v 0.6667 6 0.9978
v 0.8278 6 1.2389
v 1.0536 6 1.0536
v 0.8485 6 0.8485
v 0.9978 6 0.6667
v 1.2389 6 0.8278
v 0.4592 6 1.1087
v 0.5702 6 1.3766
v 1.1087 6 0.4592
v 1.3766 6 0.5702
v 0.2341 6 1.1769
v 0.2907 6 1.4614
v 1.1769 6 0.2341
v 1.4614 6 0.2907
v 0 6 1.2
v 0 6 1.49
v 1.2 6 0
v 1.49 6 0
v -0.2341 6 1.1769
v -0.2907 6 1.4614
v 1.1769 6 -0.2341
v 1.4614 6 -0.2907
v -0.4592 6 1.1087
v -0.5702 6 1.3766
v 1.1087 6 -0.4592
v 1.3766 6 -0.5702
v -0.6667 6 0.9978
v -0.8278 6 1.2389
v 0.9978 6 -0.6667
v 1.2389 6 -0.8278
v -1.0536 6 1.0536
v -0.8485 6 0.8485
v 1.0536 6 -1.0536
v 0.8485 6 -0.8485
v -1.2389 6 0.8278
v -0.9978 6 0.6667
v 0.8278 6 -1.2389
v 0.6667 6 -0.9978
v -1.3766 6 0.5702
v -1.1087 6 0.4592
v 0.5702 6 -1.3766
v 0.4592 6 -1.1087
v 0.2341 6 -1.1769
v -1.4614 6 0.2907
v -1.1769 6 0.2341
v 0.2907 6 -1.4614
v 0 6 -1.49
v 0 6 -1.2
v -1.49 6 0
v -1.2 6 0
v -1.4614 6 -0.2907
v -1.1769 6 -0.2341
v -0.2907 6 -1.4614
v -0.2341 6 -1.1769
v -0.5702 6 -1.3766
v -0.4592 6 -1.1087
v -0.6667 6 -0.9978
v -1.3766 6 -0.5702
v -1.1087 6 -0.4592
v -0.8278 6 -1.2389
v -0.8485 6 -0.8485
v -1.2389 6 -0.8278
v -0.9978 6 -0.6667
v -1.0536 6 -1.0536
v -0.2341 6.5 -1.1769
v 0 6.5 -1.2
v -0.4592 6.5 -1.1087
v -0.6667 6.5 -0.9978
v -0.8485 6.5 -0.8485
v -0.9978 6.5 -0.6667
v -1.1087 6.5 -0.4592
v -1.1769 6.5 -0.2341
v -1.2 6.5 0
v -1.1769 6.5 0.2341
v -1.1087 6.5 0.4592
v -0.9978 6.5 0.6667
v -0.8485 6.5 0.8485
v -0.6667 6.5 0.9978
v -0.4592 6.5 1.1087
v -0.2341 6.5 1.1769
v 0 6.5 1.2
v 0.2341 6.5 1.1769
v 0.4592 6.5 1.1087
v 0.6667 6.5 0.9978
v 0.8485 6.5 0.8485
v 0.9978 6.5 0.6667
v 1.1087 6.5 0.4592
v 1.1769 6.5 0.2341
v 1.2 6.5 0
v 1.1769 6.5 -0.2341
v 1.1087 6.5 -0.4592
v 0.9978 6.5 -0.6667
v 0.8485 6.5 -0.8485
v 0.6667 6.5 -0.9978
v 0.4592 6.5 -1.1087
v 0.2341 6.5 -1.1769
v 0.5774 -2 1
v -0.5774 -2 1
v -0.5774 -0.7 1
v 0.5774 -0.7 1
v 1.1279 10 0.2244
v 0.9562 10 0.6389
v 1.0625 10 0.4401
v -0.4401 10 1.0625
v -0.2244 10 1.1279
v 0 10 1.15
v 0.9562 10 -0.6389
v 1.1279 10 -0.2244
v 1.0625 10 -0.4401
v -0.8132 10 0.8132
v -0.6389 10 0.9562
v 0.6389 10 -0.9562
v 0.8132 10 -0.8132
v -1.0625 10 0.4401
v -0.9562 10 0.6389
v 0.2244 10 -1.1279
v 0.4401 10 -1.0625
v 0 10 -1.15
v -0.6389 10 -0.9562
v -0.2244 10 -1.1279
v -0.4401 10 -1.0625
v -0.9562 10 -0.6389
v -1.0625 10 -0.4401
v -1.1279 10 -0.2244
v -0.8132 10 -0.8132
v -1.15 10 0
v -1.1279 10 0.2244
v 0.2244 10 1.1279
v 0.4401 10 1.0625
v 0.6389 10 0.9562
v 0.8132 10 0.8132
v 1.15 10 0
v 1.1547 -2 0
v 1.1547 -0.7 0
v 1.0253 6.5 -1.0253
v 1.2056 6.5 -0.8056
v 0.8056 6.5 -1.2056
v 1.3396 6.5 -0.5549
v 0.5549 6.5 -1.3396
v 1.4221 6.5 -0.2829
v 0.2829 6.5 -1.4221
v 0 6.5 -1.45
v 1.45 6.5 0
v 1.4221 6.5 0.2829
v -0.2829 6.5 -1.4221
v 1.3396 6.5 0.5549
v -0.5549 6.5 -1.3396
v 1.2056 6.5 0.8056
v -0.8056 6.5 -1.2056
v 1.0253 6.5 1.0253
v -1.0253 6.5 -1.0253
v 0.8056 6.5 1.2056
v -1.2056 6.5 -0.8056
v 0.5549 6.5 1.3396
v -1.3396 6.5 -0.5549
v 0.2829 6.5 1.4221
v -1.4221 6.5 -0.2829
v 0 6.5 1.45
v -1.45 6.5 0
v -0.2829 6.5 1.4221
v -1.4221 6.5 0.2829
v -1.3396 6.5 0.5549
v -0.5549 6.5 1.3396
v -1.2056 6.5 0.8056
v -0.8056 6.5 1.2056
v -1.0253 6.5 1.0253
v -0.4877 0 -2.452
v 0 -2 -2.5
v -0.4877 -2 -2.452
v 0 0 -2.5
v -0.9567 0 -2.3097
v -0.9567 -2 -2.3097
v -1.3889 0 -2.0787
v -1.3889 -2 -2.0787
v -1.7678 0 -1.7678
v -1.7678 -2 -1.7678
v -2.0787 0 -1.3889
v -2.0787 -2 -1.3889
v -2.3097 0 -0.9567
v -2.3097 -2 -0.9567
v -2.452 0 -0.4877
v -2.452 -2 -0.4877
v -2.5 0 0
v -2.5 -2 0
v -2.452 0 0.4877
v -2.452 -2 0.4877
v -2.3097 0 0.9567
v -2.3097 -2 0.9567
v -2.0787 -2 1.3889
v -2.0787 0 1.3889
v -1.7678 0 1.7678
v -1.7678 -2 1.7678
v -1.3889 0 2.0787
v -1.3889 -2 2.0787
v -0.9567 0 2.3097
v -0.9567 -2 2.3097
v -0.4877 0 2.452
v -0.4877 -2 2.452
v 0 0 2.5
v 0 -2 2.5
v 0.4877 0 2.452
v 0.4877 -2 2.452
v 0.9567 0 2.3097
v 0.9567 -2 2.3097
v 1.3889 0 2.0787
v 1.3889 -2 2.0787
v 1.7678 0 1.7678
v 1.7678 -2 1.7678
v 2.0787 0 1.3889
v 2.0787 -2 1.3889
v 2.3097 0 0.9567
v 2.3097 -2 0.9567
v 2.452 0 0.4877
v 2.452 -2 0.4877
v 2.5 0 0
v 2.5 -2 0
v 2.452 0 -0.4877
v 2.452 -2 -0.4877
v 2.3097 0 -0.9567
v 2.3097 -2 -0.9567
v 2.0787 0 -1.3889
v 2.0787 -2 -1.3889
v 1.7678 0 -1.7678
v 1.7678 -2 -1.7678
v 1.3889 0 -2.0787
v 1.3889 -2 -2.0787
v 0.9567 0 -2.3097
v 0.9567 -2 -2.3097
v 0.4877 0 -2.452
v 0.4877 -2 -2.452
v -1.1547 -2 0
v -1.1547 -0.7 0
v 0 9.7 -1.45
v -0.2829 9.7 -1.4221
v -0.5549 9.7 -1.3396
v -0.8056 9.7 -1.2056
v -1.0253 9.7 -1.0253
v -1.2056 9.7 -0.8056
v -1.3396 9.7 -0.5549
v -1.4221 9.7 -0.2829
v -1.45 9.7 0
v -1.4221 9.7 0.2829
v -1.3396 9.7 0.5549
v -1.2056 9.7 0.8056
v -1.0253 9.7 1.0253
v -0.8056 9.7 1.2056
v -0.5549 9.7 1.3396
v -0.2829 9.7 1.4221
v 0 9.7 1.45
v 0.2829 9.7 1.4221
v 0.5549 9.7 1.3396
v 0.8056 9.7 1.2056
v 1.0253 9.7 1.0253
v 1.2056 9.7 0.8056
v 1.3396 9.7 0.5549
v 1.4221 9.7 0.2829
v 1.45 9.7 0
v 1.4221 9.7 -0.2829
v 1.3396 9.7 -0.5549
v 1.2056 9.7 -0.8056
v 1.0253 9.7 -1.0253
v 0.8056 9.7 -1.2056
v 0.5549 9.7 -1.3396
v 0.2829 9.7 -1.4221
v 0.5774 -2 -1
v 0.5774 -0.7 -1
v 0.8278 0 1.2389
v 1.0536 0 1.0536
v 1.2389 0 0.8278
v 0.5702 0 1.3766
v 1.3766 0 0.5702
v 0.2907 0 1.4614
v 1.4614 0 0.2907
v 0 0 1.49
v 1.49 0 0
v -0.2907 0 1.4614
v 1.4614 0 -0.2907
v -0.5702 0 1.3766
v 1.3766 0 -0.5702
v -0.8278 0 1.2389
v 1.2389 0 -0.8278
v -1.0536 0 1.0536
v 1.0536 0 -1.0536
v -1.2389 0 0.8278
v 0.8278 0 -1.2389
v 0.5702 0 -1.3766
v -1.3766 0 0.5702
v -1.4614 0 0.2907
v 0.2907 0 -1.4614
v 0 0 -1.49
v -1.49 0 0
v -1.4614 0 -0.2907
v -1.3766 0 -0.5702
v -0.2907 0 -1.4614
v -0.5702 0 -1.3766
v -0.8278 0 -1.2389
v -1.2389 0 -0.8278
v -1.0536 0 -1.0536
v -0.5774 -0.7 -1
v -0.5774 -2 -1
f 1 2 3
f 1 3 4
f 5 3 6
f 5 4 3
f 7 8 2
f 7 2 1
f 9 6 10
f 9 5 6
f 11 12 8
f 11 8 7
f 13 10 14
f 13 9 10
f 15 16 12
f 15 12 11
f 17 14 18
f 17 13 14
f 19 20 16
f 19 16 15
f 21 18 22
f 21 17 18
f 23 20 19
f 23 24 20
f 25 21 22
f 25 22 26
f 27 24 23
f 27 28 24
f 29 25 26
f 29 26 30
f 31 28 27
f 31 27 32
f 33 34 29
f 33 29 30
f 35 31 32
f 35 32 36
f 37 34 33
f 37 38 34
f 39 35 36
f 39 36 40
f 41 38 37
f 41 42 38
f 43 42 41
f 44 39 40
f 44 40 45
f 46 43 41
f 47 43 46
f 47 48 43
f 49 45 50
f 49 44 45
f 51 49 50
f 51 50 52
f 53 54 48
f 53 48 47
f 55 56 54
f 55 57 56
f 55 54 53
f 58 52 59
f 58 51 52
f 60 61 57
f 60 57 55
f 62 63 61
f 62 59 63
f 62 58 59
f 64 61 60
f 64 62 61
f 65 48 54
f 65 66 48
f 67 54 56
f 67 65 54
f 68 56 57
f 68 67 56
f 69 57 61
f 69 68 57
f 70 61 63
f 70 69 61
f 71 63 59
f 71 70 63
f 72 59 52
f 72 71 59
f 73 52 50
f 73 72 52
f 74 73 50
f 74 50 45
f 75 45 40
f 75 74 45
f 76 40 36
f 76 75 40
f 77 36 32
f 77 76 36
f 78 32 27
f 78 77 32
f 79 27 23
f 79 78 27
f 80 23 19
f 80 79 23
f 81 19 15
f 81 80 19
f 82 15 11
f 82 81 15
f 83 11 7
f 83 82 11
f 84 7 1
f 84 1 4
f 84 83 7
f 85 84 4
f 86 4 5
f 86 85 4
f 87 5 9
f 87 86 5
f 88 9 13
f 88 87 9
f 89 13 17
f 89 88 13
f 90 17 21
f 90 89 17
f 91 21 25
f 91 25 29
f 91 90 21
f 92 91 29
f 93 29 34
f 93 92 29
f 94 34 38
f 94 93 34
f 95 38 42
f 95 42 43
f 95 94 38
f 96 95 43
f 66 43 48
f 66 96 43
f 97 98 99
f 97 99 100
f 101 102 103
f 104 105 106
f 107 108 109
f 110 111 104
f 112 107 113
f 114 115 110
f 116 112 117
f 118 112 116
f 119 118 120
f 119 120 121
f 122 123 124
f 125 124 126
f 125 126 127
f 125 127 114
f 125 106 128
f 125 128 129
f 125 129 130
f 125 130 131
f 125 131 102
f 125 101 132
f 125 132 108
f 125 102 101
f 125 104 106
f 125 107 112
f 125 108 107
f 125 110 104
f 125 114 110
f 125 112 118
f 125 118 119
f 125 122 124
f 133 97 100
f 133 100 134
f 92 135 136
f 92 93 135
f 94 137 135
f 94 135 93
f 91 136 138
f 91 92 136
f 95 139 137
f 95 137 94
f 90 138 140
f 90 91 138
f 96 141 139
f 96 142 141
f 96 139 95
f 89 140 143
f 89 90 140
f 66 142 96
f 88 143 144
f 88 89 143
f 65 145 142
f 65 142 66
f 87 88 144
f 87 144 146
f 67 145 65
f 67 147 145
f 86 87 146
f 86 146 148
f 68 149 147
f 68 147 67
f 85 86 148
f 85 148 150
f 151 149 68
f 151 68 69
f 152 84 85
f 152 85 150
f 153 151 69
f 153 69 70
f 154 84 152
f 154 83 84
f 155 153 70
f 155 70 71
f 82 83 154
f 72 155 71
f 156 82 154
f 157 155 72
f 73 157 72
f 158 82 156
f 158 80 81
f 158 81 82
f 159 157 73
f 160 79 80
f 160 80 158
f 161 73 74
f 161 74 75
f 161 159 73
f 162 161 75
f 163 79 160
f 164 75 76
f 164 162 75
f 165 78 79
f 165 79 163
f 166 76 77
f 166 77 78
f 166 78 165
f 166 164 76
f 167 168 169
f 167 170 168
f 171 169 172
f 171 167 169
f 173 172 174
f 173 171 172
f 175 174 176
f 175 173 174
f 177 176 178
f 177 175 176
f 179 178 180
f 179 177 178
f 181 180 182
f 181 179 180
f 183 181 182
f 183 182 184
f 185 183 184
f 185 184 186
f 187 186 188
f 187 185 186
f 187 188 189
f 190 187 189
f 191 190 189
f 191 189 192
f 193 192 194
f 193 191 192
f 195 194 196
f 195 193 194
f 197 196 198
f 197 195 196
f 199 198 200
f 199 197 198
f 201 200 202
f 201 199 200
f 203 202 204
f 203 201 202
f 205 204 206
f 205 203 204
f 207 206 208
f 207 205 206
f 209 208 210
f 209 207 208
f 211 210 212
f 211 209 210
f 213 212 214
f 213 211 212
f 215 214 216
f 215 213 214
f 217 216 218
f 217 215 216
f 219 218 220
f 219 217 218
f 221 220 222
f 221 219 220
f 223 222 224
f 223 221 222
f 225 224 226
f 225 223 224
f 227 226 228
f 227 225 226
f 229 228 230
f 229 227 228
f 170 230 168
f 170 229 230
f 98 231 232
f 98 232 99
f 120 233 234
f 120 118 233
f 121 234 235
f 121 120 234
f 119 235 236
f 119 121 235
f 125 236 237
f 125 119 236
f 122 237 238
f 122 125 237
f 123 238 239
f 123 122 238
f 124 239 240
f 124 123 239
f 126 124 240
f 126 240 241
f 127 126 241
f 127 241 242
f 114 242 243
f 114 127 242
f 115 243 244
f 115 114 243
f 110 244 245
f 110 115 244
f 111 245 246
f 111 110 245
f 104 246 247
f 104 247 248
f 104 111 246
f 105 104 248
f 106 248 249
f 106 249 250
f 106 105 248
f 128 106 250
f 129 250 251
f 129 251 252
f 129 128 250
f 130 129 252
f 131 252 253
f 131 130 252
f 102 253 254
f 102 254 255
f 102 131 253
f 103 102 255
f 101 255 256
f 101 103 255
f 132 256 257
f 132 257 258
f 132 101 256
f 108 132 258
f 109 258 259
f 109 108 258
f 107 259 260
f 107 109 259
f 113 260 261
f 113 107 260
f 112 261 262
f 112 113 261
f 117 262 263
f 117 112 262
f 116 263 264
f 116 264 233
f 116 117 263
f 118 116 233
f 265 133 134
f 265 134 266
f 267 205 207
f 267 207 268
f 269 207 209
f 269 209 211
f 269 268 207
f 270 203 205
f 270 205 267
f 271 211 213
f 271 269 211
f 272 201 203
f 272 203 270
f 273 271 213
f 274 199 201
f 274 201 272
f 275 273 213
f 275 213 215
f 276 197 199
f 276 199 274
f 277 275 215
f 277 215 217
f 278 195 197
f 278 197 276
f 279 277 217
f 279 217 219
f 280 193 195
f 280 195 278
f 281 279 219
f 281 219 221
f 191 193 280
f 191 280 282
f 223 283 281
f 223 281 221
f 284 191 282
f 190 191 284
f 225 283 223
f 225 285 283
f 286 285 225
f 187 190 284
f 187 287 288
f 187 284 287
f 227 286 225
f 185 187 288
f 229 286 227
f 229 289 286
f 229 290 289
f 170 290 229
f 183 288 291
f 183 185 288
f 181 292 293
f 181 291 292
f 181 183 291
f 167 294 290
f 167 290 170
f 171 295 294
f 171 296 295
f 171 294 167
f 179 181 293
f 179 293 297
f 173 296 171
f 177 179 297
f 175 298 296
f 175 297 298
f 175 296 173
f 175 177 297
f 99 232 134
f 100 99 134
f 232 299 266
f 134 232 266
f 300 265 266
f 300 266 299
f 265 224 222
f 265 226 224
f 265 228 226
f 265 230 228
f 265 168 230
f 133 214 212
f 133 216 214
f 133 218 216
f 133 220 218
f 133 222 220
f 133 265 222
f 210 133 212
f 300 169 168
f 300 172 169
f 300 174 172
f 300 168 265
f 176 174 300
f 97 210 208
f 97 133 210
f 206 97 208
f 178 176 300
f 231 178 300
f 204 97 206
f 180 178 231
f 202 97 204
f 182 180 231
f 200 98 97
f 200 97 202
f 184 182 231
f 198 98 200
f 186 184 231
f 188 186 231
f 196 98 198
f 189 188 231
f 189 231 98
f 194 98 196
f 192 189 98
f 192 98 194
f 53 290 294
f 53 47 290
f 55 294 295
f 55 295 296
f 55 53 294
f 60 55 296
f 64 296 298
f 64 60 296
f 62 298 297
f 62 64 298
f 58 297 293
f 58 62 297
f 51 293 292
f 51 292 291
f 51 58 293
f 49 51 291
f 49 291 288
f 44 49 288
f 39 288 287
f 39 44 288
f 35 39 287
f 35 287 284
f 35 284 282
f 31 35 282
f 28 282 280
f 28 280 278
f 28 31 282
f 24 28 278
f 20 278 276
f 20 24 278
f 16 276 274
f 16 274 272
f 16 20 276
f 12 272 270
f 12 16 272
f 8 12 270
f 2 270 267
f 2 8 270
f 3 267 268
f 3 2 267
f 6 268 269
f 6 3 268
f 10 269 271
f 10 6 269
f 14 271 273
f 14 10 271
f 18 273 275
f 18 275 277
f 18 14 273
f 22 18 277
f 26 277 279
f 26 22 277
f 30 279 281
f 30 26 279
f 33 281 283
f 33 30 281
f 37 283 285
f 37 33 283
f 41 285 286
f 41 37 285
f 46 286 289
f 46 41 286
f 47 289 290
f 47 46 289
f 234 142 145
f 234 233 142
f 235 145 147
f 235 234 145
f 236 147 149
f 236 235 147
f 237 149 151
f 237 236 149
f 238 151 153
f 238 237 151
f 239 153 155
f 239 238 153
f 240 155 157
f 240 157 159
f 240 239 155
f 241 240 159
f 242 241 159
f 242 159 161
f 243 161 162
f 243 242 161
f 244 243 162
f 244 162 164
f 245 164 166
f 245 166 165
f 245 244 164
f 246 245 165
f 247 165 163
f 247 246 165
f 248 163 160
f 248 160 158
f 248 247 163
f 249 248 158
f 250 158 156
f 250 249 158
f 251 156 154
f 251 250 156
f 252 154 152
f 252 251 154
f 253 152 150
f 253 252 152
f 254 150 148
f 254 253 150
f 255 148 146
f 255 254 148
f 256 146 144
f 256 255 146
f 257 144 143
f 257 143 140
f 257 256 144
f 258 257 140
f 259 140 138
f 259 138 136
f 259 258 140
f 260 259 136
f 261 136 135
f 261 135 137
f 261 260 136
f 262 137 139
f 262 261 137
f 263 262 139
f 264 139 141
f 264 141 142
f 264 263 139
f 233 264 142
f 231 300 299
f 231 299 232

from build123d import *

# Parameters (mm, degrees)
ENL_V_START             = -2
ENL_V_MAT_EXTRU_1_DEPTH = 1.3


with BuildPart() as part:
    # Esquisse1 → Révolution1 (revolve)
    with BuildSketch(Plane.XY, mode=Mode.PRIVATE) as r_volution1_sk:
        Polygon((0, -2), (2.5, -2), (2.5, 0), (2.3, 0), (1.49, 0), (1.49, 6), (1.2, 6), (1.2, 6.5), (1.45, 6.5), (1.45, 9.7), (1.15, 10), (0, 10), align=None)
    revolve(r_volution1_sk.sketch.rotate(Axis((0, -4, 0), (0, 1, 0)), 90), axis=Axis((0, -4, 0), (0, 1, 0)))

    # Esquisse2 → Enlèv. mat.-Extru.1 (cut)
    with BuildSketch(Plane(origin=(0, 0, 0), x_dir=(1, 0, 0), z_dir=(0, 1, 0)).offset(ENL_V_START)):
        Polygon((1.154700538, 0), (0.577350269, 1), (-0.577350269, 1), (-1.154700538, 0), (-0.577350269, -1), (0.577350269, -1), align=None)
    extrude(amount=ENL_V_MAT_EXTRU_1_DEPTH, mode=Mode.SUBTRACT)


solid = part.part
